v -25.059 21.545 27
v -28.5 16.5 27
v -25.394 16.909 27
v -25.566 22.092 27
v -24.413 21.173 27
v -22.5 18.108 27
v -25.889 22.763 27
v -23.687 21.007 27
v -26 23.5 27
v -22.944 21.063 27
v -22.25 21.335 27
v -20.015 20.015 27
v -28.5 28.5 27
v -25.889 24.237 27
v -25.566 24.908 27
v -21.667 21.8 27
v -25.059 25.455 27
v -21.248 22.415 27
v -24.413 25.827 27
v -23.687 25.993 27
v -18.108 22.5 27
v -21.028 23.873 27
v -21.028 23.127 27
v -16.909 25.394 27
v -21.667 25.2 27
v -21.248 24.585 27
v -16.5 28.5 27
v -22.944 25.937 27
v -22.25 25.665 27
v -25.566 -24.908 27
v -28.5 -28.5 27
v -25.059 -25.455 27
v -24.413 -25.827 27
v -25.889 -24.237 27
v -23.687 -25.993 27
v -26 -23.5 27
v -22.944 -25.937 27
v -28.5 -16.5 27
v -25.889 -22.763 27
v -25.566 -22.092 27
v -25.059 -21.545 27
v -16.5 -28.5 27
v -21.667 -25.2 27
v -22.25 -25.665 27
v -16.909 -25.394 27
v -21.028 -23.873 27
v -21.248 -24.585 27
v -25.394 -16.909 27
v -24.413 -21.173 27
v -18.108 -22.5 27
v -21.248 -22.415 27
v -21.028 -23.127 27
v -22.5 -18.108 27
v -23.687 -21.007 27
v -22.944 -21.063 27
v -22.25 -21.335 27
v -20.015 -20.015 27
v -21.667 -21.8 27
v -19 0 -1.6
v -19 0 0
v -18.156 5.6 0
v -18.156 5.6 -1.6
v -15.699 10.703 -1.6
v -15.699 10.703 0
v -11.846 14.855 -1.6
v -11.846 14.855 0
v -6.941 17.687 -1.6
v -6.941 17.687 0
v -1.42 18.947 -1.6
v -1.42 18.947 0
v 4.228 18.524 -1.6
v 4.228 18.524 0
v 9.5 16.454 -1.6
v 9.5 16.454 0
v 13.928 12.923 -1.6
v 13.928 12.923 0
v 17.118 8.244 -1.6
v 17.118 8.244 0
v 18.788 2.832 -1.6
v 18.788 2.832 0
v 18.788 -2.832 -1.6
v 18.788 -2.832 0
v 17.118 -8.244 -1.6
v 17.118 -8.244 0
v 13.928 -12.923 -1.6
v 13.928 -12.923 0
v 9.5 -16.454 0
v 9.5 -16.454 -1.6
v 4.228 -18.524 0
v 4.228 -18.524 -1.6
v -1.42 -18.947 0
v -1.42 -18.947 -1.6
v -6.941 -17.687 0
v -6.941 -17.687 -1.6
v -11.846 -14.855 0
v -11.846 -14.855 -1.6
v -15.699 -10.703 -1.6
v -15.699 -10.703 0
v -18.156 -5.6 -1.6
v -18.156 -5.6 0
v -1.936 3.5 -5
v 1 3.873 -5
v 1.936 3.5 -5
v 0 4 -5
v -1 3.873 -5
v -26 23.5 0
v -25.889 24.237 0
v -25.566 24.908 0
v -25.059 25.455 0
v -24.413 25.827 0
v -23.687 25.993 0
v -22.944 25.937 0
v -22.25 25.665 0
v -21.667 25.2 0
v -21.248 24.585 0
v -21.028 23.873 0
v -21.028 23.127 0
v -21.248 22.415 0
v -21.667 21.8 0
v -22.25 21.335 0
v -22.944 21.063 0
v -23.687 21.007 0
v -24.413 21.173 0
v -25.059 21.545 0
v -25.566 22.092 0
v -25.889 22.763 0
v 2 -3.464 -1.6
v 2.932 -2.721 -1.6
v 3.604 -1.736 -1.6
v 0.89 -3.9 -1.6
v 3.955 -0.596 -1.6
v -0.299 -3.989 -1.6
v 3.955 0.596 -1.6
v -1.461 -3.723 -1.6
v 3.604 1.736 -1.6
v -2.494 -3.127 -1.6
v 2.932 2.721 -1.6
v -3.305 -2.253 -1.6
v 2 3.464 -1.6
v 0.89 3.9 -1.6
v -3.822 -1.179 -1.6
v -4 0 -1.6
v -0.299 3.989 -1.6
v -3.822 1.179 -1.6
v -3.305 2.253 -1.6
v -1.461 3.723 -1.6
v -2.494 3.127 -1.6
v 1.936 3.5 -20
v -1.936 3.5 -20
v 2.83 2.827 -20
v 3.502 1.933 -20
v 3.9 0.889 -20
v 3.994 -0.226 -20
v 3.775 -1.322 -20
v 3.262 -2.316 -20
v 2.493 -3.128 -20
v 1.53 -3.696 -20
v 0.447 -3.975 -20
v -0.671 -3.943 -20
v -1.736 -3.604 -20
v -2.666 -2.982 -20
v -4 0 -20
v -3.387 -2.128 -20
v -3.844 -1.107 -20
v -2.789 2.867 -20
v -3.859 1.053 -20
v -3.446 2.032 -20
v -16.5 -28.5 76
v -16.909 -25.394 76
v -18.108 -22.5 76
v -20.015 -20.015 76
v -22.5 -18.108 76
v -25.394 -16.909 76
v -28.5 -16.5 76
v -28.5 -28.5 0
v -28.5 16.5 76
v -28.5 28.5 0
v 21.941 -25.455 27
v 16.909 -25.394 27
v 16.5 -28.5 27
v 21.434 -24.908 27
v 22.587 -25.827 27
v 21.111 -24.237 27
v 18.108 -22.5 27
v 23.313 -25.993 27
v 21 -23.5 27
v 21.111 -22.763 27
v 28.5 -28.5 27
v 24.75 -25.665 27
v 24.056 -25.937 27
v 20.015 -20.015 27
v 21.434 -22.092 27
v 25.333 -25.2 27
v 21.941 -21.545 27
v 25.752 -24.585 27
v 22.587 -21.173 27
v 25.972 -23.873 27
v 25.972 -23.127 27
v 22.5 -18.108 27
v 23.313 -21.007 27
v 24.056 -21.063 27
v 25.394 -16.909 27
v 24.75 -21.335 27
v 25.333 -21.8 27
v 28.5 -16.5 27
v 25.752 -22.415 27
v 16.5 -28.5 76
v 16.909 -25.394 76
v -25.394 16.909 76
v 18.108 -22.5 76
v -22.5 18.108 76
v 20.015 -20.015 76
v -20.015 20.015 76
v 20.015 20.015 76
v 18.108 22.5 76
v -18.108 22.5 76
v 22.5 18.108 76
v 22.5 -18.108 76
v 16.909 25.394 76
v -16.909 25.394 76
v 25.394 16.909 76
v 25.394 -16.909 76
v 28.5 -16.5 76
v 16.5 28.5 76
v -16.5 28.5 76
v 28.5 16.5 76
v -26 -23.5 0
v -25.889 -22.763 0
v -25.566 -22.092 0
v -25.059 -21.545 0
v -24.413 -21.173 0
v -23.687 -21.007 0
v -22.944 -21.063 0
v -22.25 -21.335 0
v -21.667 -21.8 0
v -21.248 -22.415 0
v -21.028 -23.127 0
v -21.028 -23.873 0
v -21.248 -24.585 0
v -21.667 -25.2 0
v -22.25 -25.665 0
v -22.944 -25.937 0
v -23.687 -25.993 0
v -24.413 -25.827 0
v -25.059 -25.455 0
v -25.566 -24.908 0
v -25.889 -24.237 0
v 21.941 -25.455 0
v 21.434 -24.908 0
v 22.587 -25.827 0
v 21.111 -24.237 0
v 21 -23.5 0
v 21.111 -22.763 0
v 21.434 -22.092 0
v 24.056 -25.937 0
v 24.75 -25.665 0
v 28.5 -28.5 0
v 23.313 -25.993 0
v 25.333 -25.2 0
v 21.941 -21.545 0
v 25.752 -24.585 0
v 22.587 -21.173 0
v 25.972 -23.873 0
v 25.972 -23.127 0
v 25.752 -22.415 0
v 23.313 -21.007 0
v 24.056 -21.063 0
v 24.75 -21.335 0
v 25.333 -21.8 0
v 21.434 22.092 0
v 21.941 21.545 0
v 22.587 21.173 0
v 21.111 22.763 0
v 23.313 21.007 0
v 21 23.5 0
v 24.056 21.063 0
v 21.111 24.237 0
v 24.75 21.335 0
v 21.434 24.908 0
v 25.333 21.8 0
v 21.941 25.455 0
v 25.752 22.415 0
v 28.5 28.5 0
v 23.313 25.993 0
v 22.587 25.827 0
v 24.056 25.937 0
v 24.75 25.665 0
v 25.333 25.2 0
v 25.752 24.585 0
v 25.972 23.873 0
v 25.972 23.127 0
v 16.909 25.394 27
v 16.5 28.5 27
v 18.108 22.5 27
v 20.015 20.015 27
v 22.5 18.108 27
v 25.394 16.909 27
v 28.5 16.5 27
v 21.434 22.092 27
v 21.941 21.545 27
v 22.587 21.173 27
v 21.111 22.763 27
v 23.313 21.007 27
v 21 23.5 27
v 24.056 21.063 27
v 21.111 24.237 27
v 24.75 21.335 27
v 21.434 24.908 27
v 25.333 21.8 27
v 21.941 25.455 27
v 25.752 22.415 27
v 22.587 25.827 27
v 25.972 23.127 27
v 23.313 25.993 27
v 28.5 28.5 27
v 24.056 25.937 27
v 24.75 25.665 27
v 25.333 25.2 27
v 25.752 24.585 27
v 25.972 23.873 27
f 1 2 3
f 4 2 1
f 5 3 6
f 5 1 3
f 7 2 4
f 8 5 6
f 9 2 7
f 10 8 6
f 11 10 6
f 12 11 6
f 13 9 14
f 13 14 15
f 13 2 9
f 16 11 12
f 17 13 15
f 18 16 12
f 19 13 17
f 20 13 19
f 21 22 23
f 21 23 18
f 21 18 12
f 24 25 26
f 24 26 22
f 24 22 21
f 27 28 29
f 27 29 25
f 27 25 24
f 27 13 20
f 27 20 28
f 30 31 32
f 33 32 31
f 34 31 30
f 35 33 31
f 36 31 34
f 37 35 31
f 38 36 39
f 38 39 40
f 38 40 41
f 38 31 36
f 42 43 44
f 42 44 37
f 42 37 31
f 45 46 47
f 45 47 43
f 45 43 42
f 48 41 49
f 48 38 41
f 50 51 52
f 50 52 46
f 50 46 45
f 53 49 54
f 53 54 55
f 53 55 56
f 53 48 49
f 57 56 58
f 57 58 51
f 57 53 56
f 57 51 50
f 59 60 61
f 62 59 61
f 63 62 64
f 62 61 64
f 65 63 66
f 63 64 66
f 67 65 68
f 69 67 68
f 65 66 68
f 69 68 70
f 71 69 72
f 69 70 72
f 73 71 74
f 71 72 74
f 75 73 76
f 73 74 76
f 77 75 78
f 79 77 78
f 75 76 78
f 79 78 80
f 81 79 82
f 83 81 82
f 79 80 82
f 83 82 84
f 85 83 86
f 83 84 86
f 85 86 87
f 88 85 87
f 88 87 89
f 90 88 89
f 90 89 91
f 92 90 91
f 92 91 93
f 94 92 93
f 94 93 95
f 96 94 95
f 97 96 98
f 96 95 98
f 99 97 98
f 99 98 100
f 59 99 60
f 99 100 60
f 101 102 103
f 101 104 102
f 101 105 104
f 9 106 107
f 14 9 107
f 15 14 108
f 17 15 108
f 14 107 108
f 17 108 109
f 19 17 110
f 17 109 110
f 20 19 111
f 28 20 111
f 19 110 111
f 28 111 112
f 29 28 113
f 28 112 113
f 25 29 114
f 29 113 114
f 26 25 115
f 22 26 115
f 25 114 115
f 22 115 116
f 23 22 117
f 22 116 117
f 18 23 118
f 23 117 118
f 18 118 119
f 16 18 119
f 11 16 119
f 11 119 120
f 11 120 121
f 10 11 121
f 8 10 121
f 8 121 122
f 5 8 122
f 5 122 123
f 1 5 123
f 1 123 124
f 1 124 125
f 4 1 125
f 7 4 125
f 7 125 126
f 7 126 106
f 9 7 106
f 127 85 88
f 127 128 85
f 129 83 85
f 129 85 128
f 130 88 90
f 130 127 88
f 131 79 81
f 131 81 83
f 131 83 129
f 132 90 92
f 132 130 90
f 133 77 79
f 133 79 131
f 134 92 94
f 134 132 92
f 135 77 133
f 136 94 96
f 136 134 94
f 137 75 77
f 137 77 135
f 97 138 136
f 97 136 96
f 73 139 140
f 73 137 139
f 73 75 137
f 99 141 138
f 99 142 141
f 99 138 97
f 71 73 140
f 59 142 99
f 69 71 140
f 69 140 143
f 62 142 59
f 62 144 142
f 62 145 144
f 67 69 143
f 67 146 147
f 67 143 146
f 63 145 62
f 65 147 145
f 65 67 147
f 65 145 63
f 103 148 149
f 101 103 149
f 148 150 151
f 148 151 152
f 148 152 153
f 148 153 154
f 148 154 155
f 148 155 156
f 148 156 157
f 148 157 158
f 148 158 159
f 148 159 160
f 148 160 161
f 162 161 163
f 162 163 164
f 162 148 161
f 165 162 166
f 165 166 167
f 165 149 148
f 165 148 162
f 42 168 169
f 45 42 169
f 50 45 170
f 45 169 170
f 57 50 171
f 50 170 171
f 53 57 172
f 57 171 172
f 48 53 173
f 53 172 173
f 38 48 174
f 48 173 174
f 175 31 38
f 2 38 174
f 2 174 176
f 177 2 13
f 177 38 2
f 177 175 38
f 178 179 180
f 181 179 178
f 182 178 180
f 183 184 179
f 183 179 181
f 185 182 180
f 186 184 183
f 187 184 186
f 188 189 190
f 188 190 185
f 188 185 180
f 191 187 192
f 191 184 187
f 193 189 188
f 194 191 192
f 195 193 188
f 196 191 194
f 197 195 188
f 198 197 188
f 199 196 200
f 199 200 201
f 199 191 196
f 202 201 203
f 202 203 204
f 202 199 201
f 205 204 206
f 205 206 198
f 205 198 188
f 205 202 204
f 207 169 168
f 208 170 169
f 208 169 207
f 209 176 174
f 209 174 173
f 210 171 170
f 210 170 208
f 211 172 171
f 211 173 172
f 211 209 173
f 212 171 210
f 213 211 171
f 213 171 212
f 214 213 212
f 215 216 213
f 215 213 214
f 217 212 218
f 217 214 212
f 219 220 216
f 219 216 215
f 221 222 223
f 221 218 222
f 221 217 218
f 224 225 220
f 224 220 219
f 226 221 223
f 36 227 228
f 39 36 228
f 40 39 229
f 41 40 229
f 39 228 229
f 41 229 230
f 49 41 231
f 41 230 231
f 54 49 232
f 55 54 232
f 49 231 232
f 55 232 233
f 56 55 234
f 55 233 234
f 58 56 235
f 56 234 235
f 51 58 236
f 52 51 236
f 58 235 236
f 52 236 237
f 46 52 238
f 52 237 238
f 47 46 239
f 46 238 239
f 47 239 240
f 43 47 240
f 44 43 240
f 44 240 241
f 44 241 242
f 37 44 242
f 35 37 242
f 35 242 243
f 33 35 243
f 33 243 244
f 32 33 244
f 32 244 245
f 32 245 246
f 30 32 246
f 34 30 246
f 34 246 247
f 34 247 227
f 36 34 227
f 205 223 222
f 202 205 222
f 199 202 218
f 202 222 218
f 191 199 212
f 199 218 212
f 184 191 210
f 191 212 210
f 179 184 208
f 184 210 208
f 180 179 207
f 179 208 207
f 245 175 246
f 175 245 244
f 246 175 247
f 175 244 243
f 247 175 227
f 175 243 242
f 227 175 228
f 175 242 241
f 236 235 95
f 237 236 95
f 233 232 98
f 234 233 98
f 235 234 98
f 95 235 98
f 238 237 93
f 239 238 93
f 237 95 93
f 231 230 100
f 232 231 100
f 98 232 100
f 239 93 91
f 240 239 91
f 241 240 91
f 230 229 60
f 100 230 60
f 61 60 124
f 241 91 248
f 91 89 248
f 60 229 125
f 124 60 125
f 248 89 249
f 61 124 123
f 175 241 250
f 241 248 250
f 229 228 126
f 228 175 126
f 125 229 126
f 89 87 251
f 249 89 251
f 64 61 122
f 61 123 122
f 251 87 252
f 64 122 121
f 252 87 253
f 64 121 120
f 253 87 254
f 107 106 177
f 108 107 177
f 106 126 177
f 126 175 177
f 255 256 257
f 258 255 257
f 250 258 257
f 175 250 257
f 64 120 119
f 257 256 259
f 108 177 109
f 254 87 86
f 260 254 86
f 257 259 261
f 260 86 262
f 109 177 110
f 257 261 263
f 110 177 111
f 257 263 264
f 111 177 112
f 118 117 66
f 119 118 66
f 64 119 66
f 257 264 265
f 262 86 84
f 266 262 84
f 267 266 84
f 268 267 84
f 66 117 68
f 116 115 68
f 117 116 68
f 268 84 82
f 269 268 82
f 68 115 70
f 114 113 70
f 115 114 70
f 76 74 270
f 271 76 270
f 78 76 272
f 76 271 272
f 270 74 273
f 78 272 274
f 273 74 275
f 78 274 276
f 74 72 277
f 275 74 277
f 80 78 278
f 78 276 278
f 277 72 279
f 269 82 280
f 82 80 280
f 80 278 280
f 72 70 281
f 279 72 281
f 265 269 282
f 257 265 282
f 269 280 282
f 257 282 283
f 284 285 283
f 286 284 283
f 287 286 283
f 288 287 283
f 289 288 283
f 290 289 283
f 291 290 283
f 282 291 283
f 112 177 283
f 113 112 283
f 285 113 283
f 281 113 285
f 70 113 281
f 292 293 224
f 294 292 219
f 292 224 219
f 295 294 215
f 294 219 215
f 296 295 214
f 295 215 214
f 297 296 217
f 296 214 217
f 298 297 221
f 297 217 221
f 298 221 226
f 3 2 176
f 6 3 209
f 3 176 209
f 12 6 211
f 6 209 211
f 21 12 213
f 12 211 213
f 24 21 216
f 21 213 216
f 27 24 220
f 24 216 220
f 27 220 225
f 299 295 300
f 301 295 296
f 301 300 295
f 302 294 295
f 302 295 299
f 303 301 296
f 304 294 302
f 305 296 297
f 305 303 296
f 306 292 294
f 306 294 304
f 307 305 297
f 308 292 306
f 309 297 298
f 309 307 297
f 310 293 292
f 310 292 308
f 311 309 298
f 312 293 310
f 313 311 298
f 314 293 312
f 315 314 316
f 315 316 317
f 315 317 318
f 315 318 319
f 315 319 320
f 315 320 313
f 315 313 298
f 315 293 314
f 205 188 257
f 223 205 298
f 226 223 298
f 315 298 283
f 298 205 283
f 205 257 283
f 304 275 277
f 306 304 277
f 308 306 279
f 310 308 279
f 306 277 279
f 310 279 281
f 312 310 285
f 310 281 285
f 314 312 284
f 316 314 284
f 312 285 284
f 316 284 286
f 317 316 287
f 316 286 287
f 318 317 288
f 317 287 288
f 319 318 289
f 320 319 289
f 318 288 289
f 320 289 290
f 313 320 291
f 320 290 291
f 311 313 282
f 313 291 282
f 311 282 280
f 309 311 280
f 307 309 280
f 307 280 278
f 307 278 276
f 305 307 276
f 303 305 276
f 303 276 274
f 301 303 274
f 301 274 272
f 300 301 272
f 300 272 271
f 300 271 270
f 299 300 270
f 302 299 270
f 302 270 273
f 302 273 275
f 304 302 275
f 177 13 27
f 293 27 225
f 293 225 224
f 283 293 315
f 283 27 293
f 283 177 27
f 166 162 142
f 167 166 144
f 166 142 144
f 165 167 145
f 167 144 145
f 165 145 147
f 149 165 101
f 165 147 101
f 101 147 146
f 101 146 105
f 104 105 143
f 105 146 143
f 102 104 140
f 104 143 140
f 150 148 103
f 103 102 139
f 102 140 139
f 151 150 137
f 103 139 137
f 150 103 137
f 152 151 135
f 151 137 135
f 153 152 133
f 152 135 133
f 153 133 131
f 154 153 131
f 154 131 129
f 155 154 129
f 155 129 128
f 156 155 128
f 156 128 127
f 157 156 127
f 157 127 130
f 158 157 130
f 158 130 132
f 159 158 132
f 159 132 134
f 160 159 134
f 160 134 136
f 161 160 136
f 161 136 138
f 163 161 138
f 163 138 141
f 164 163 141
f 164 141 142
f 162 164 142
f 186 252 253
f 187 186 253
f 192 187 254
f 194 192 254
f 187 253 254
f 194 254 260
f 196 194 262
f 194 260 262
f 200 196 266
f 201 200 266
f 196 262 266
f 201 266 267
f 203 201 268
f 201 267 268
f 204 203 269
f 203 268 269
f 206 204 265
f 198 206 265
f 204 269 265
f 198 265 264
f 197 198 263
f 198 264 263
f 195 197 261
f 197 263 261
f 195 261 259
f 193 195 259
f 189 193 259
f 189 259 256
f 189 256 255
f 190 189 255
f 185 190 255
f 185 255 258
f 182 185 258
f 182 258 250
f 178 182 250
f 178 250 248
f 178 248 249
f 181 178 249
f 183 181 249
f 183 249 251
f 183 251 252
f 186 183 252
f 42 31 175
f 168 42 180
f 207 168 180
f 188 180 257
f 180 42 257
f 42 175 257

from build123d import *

# Parameters (mm, degrees)
SKETCH_1_W          = 57
SKETCH_1_H          = 57
EXTRUDE_1_DEPTH     = 76
SKETCH_2_R          = 12
CUT_EXTRUDE_1_DEPTH = 49
SKETCH_3_R          = 2.5
CUT_EXTRUDE_2_DEPTH = 87.026158812
SKETCH_4_R          = 19
EXTRUDE_2_DEPTH     = 1.6
SKETCH_5_R          = 4
EXTRUDE_3_DEPTH     = 18.4
SKETCH_6_W          = 13.034699884
SKETCH_6_H          = 1
CUT_EXTRUDE_3_DEPTH = 15


with BuildPart() as part:
    # 草图1 → 凸台-拉伸1 (new body)
    with BuildSketch(Plane.XY):
        Rectangle(SKETCH_1_W, SKETCH_1_H)
    extrude(amount=EXTRUDE_1_DEPTH)

    # 草图2 → 切除-拉伸1 (cut)
    with BuildSketch(Plane.XY.offset(76)):
        with Locations((-28.5, 28.5)):
            Circle(SKETCH_2_R)
        with Locations((28.5, 28.5)):
            Circle(SKETCH_2_R)
        with Locations((-28.5, -28.5)):
            Circle(SKETCH_2_R)
        with Locations((28.5, -28.5)):
            Circle(SKETCH_2_R)
    extrude(amount=-CUT_EXTRUDE_1_DEPTH, mode=Mode.SUBTRACT)

    # 草图3 → 切除-拉伸2 (cut, through all)
    with BuildSketch(Plane(origin=(0, 0, 0), x_dir=(-1, 0, 0), z_dir=(0, 0, -1))):
        with Locations((-23.5, 23.5)):
            Circle(SKETCH_3_R)
        with Locations((23.5, 23.5)):
            Circle(SKETCH_3_R)
        with Locations((-23.5, -23.5)):
            Circle(SKETCH_3_R)
        with Locations((23.5, -23.5)):
            Circle(SKETCH_3_R)
    extrude(amount=-CUT_EXTRUDE_2_DEPTH, mode=Mode.SUBTRACT)

    # 草图4 → 凸台-拉伸2 (add)
    with BuildSketch(Plane(origin=(0, 0, 0), x_dir=(-1, 0, 0), z_dir=(0, 0, -1))):
        Circle(SKETCH_4_R)
    extrude(amount=EXTRUDE_2_DEPTH)

    # 草图5 → 凸台-拉伸3 (add)
    with BuildSketch(Plane(origin=(0, 0, -1.6), x_dir=(-1, 0, 0), z_dir=(0, 0, -1))):
        Circle(SKETCH_5_R)
    extrude(amount=EXTRUDE_3_DEPTH)

    # 草图6 → 切除-拉伸3 (cut)
    with BuildSketch(Plane(origin=(0, 0, -20), x_dir=(-1, 0, 0), z_dir=(0, 0, -1))):
        with Locations((0, 4)):
            Rectangle(SKETCH_6_W, SKETCH_6_H)
    extrude(amount=-CUT_EXTRUDE_3_DEPTH, mode=Mode.SUBTRACT)


solid = part.part
